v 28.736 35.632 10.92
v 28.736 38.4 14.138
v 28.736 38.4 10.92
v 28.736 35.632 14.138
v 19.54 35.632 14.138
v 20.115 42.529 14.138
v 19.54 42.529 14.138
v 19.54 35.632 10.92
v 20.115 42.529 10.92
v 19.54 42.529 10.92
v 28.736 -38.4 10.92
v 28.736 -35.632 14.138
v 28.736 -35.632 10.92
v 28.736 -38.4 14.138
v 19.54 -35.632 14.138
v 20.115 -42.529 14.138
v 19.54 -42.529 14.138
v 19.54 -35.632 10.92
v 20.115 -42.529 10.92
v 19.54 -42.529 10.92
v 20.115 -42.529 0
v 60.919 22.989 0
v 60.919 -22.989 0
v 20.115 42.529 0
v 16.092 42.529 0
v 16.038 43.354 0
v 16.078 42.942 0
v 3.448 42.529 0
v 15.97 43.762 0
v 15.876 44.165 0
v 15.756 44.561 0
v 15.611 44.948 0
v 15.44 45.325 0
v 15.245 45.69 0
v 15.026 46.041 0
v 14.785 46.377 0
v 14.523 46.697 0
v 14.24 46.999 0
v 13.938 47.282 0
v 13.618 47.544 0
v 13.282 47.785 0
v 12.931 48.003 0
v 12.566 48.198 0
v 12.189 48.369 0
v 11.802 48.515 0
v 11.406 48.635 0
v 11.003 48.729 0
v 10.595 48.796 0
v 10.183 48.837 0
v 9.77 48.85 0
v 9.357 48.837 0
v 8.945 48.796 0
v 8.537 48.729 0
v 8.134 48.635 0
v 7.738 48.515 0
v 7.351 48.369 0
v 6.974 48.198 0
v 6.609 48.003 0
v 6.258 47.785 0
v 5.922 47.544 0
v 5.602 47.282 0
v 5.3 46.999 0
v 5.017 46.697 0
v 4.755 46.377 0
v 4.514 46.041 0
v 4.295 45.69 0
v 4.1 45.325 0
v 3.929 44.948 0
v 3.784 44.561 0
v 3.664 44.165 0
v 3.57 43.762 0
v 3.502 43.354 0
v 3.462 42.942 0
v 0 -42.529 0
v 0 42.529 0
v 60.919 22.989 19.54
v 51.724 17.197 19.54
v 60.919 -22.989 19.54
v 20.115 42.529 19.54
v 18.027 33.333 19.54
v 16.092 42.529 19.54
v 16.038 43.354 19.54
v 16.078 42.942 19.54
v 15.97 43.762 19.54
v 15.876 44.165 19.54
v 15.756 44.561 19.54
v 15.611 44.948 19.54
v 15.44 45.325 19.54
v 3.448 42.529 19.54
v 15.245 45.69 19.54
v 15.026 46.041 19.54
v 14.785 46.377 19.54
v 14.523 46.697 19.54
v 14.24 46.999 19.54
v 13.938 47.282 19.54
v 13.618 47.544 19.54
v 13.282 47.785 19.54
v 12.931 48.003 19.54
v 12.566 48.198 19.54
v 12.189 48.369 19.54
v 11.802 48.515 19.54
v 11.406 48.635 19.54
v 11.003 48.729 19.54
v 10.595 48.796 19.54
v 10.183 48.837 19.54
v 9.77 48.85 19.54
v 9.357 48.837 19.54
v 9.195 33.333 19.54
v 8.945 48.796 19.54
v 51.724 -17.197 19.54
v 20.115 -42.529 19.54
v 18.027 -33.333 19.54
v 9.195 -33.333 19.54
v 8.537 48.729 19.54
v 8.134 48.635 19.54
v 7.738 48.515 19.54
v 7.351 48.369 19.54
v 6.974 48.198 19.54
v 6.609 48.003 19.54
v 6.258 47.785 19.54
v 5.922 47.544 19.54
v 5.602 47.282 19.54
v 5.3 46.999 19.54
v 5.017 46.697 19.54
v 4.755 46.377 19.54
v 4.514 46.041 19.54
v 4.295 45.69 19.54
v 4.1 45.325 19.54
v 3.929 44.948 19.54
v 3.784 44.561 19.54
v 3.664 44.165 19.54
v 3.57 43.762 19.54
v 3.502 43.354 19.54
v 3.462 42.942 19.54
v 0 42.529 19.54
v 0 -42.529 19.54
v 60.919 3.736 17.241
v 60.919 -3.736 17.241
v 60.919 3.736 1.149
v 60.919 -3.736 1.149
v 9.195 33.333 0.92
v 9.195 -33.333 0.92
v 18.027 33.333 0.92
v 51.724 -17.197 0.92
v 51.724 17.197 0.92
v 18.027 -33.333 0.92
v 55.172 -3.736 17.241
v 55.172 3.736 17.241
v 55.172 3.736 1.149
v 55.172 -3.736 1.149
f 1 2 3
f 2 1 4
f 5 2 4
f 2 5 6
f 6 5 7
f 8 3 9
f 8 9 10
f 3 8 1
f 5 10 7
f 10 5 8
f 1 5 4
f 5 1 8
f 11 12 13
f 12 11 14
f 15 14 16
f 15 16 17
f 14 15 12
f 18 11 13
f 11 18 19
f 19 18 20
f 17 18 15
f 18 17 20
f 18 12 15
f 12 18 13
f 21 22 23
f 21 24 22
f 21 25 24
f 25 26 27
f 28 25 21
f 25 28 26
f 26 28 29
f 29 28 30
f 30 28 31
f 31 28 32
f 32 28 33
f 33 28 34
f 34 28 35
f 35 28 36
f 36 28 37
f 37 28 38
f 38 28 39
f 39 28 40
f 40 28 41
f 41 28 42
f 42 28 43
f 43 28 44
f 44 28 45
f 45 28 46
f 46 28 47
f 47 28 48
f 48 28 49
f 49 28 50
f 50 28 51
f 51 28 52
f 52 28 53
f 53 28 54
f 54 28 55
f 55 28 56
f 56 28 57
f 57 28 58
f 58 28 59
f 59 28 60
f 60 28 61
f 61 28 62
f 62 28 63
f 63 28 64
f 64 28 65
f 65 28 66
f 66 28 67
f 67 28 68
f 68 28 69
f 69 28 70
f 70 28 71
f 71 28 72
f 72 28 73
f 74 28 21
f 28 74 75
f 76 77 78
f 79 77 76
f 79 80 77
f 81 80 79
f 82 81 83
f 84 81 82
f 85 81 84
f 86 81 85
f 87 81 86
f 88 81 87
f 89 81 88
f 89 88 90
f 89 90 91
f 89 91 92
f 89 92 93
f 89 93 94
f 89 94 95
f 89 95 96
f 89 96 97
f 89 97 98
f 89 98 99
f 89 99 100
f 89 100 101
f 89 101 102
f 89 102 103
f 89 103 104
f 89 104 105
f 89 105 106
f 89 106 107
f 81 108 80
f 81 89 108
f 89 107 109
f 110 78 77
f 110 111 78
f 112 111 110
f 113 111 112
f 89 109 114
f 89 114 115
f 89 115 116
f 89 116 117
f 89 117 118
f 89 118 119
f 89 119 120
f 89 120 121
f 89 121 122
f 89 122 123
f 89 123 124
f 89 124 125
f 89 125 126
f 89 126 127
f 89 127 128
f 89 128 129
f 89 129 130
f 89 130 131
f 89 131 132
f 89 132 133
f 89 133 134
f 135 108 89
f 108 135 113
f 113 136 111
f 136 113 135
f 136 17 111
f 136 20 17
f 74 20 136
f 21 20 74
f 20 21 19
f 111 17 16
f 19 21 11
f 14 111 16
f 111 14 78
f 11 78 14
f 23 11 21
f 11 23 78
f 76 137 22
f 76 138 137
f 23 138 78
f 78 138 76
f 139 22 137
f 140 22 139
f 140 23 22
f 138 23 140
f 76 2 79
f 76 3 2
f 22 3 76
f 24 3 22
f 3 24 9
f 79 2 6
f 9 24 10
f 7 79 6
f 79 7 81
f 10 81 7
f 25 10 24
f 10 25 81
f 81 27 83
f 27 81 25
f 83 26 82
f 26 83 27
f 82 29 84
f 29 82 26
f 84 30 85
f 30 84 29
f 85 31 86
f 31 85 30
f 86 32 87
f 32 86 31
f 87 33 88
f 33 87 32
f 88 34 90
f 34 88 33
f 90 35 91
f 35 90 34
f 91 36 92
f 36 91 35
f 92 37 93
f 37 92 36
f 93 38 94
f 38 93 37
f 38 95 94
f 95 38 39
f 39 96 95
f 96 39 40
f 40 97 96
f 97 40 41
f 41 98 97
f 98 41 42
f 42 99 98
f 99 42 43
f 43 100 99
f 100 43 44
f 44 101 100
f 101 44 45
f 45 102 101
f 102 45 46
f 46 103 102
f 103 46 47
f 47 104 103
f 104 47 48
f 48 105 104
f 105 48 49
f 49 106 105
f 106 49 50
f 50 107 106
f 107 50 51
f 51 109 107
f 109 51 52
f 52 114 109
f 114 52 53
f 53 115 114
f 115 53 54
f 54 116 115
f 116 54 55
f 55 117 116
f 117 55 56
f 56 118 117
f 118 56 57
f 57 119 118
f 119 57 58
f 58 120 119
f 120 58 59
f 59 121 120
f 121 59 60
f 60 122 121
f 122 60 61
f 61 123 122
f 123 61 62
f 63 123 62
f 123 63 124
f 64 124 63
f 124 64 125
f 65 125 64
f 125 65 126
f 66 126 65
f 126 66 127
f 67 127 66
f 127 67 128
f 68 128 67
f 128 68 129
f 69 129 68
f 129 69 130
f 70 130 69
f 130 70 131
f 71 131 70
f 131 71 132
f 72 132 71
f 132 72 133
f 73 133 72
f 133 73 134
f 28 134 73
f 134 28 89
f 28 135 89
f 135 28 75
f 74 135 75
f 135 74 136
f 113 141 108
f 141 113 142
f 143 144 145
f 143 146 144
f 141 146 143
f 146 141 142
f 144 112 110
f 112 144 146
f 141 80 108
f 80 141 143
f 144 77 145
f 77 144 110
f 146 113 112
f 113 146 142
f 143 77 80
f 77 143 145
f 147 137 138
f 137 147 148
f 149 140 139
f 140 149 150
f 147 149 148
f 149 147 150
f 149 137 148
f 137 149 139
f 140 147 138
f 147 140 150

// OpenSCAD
// ============================================================
// LO vz. 37 — typ A (řopík) — parametrický model pro 3D tisk
// Katalog ŘOP — klepeto.kuzelovi.cz/rop | GitHub: Vilda007/rop2stl
//
// HISTORICKÁ VĚRNOST v8.4 — ORIENTACE dle Vilda 10:59:
//   „Rovná strana s vybíhajícími ušima je NAPROTI vchodu (strana k nepříteli)"
//   => x=0 = ČELO k nepříteli: rovná široká stěna 7,40 m + UŠI-KŘÍDLA na bocích
//   => x=X_tyl = TÝL: úzká rovná stěna 4,0 m se zapuštěným VCHODEM
//
// Geometrie dle řezové analýzy referenčního STL (Vilda/makerworld 769524,
// normalizace 105 mm = 8,70 m [DENK]) — zrcadleno dle správné orientace.
//
// POUŽITÍ:
//   openscad -o korpus.stl -D "scale_denom=87" -D "part=0" -D "variant=180" ropik-a.scad
//   openscad -o strecha.stl -D "scale_denom=87" -D "part=1" -D "variant=180" ropik-a.scad
//   scale_denom: 87=H0, 120, 144=N, 72, 48, 35 | variant: 120|140|160|180|200|220
// ============================================================

/* [Parametry] */
scale_denom = 87;       // jmenovatel měřítka
part = 0;               // 0=korpus, 1=střecha
variant = 180;          // úhel os střílen (120–220)
provedeni = "normal";   // zeslabene/normal/zesilene
roof_tol_mm = 0.25;     // vůle střechy (mm v měřítku)
strilny = 1;            // 1=prostříznuté střílnové otvory

// ---------- Šířky variant [DENK; A-160 s KST konfliktem] ----------
function width_variant(v) =
  v==120 ? 7.70 :
  v==140 ? 6.95 :
  v==160 ? 6.93 :   // [KST A160Z; Denkschrift 7,40 — konflikt, uvádíme obě]
  v==180 ? 8.70 :
  v==200 ? 8.40 : 8.70;

W = width_variant(variant);   // max šířka přes UŠI [m]

// ---------- Topologie v8.4 (orientace dle Vilda + REF STL zrcadleno) ----------
X_cel  = 0;      // ČELO k nepříteli — rovná široká stěna
W_cel  = 7.40;   // šířka čelní stěny [REF: 90/105 mm × 8,70]
X_kr_f = 0.30;   // přední hrana ucha (hned za čelem)
R_ear  = 0.55;   // poloměr zakulaceného ucha [≈ REF STL: výstupek ~0,55 m]
X_ear_c = X_kr_f + R_ear;   // střed ucha (pro arc)
d_kr   = 1.10;   // celková hloubka ucha [REF ≈ 1,1 m]
X_kr_b = X_kr_f + d_kr;   // zadní hrana ucha (střílna ZA ním)
X_stril = X_kr_b + 0.30;   // STŘÍLNA: v polovině šířky stěny, ZA UCEM [Vilda 11:22]
W_body = 7.15;   // šířka těla mezi ušima a rameny [REF: 86–89 mm]
X_sh   = X_kr_b + 0.35;   // konec boků těla, začátek ramen
X_tyl  = 5.30;   // TÝL — rovná úzká stěna [REF: 64/105 mm × 8,70]
W_tyl  = 4.00;   // šířka týlní stěny [REF: 48/105 mm × 8,70]

h_int  = 1.70;   // světlá vnitřní výška [≈ — ověřit z KST A140Z_rezy]
h_cor  = 1.40;   // výška vstupní chodby [≈]
w_door = 0.65;   // šířka vchodu [DENK]
d_alc  = 0.50;   // hloubka zapuštěného portálku [≈ fotodok.]
w_strel = 0.30;  // šířka střílny [≈]
h_strel = 0.28;  // výška střílny [≈]
z_strel = 0.95;  // spodní hrana střílny nad podlahou [≈]

prov = provedeni == "zeslabene" ? [0.60,0.55] : provedeni == "zesilene" ? [1.00,1.20] : [0.80,0.80];
t_wall = prov[0];
t_roof = prov[1];

// ---------- Měřítko ----------
function mm(m) = m * 1000 / scale_denom;
S = 1000 / scale_denom;

// ---------- Půdorys (x=0 čelo k nepříteli, +x týl; y=0 osa) ----------
module hull2d() {
  scale([S, S])
  union() {
    // hlavní tělo (bez uší): čelo → boky → ramena → týl
    polygon([
      [X_cel,   W_cel/2],   // ČELO P (rovná stěna 7,40 m)
      [X_kr_f,  W_cel/2],   // bok čela P → základna ucha P
      [X_kr_b,  W_cel/2],   // pokračování boku za uchem
      [X_sh,    W_cel/2],   // bok těla P (konstantní šířka k rameni)
      [X_tyl,   W_tyl/2],   // šikmé rameno → TÝL
      [X_tyl,  -W_tyl/2],   // TÝL — rovná stěna 4,0 m (VCHOD)
      [X_sh,   -W_cel/2],   // rameno L
      [X_kr_b, -W_cel/2],
      [X_kr_f, -W_cel/2],   // základna ucha L
      [X_cel,  -W_cel/2],   // ČELO L
    ]);
    // UCHO P — ZAKULACENÝ výstupek [Vilda 11:22]: půlkruh na boku,
    // střed u (X_ear_c, W_cel/2), poloměr R_ear; kryje střílnu za sebou
    translate([X_ear_c, W_cel/2])
      intersection() {
        circle(r = R_ear);
        // jen vnější půlka (y >= W_cel/2 → kvadrant ven)
        translate([0, 0]) square([R_ear*2, R_ear*2], center=true);
      }
    // UCHO L (zrcadlově)
    translate([X_ear_c, -W_cel/2])
      intersection() {
        circle(r = R_ear);
        translate([0, -R_ear*2]) square([R_ear*2, R_ear*2], center=true);
      }
  }
}

// ---------- KORPUS ----------
module korpus() {
  difference() {
    linear_extrude(height = mm(h_int))
      hull2d();
    // vnitřní dutina (otevřená shora — oddělávací střecha)
    translate([0, 0, mm(0.08)])
      linear_extrude(height = mm(h_int))
        offset(delta = -mm(t_wall))
          hull2d();
    // zapuštěný portálek + průchod V TÝLNÍ STĚNĚ [Vilda 10:59: vchod v tylové straně]
    translate([mm(X_tyl - d_alc), -mm(w_door)/2, mm(0.10)])
      cube([mm(d_alc + t_wall + 0.05), mm(w_door), mm(h_cor)]);
    // STŘÍLNY — v hlavní stěně (y=±W_cel/2), v polovině šířky stěny,
    // SCHOVANÉ ZA UCEM [Vilda 11:22] — palba PODÉL linie ±Y
    if (strilny) {
      for (m = [1, -1]) {
        translate([mm(X_stril), m > 0 ? mm(W_cel/2 - 0.60) : mm(-W_cel/2 - 0.60), mm(z_strel)])
          cube([mm(0.8), mm(1.2), mm(h_strel)]);
      }
    }
  }
}

// ---------- STŘECHA (oddělávací deska) ----------
module strecha() {
  linear_extrude(height = mm(t_roof))
    offset(delta = roof_tol_mm)
      hull2d();
}

// ---------- Export ----------
$fn = 96;
if (part == 0) { korpus(); } else { strecha(); }

echo(str("LO vz.37 A-", variant, " v8.4 | 1:", scale_denom, " | part: ", part==0?"KORPUS":"STŘECHA"));
echo(str("ČELO 7,40 m + ZAKULACENÁ uši (kryjí střílny) | střílny ZA ušima ve stěně (", variant, "°) | TÝL 4,0 m s VCHODEM"));
echo(str("Šířka přes uši ", W, " m [DENK] | hloubka ", X_tyl, " m [REF] | výšky [≈ KST k ověření]"));
